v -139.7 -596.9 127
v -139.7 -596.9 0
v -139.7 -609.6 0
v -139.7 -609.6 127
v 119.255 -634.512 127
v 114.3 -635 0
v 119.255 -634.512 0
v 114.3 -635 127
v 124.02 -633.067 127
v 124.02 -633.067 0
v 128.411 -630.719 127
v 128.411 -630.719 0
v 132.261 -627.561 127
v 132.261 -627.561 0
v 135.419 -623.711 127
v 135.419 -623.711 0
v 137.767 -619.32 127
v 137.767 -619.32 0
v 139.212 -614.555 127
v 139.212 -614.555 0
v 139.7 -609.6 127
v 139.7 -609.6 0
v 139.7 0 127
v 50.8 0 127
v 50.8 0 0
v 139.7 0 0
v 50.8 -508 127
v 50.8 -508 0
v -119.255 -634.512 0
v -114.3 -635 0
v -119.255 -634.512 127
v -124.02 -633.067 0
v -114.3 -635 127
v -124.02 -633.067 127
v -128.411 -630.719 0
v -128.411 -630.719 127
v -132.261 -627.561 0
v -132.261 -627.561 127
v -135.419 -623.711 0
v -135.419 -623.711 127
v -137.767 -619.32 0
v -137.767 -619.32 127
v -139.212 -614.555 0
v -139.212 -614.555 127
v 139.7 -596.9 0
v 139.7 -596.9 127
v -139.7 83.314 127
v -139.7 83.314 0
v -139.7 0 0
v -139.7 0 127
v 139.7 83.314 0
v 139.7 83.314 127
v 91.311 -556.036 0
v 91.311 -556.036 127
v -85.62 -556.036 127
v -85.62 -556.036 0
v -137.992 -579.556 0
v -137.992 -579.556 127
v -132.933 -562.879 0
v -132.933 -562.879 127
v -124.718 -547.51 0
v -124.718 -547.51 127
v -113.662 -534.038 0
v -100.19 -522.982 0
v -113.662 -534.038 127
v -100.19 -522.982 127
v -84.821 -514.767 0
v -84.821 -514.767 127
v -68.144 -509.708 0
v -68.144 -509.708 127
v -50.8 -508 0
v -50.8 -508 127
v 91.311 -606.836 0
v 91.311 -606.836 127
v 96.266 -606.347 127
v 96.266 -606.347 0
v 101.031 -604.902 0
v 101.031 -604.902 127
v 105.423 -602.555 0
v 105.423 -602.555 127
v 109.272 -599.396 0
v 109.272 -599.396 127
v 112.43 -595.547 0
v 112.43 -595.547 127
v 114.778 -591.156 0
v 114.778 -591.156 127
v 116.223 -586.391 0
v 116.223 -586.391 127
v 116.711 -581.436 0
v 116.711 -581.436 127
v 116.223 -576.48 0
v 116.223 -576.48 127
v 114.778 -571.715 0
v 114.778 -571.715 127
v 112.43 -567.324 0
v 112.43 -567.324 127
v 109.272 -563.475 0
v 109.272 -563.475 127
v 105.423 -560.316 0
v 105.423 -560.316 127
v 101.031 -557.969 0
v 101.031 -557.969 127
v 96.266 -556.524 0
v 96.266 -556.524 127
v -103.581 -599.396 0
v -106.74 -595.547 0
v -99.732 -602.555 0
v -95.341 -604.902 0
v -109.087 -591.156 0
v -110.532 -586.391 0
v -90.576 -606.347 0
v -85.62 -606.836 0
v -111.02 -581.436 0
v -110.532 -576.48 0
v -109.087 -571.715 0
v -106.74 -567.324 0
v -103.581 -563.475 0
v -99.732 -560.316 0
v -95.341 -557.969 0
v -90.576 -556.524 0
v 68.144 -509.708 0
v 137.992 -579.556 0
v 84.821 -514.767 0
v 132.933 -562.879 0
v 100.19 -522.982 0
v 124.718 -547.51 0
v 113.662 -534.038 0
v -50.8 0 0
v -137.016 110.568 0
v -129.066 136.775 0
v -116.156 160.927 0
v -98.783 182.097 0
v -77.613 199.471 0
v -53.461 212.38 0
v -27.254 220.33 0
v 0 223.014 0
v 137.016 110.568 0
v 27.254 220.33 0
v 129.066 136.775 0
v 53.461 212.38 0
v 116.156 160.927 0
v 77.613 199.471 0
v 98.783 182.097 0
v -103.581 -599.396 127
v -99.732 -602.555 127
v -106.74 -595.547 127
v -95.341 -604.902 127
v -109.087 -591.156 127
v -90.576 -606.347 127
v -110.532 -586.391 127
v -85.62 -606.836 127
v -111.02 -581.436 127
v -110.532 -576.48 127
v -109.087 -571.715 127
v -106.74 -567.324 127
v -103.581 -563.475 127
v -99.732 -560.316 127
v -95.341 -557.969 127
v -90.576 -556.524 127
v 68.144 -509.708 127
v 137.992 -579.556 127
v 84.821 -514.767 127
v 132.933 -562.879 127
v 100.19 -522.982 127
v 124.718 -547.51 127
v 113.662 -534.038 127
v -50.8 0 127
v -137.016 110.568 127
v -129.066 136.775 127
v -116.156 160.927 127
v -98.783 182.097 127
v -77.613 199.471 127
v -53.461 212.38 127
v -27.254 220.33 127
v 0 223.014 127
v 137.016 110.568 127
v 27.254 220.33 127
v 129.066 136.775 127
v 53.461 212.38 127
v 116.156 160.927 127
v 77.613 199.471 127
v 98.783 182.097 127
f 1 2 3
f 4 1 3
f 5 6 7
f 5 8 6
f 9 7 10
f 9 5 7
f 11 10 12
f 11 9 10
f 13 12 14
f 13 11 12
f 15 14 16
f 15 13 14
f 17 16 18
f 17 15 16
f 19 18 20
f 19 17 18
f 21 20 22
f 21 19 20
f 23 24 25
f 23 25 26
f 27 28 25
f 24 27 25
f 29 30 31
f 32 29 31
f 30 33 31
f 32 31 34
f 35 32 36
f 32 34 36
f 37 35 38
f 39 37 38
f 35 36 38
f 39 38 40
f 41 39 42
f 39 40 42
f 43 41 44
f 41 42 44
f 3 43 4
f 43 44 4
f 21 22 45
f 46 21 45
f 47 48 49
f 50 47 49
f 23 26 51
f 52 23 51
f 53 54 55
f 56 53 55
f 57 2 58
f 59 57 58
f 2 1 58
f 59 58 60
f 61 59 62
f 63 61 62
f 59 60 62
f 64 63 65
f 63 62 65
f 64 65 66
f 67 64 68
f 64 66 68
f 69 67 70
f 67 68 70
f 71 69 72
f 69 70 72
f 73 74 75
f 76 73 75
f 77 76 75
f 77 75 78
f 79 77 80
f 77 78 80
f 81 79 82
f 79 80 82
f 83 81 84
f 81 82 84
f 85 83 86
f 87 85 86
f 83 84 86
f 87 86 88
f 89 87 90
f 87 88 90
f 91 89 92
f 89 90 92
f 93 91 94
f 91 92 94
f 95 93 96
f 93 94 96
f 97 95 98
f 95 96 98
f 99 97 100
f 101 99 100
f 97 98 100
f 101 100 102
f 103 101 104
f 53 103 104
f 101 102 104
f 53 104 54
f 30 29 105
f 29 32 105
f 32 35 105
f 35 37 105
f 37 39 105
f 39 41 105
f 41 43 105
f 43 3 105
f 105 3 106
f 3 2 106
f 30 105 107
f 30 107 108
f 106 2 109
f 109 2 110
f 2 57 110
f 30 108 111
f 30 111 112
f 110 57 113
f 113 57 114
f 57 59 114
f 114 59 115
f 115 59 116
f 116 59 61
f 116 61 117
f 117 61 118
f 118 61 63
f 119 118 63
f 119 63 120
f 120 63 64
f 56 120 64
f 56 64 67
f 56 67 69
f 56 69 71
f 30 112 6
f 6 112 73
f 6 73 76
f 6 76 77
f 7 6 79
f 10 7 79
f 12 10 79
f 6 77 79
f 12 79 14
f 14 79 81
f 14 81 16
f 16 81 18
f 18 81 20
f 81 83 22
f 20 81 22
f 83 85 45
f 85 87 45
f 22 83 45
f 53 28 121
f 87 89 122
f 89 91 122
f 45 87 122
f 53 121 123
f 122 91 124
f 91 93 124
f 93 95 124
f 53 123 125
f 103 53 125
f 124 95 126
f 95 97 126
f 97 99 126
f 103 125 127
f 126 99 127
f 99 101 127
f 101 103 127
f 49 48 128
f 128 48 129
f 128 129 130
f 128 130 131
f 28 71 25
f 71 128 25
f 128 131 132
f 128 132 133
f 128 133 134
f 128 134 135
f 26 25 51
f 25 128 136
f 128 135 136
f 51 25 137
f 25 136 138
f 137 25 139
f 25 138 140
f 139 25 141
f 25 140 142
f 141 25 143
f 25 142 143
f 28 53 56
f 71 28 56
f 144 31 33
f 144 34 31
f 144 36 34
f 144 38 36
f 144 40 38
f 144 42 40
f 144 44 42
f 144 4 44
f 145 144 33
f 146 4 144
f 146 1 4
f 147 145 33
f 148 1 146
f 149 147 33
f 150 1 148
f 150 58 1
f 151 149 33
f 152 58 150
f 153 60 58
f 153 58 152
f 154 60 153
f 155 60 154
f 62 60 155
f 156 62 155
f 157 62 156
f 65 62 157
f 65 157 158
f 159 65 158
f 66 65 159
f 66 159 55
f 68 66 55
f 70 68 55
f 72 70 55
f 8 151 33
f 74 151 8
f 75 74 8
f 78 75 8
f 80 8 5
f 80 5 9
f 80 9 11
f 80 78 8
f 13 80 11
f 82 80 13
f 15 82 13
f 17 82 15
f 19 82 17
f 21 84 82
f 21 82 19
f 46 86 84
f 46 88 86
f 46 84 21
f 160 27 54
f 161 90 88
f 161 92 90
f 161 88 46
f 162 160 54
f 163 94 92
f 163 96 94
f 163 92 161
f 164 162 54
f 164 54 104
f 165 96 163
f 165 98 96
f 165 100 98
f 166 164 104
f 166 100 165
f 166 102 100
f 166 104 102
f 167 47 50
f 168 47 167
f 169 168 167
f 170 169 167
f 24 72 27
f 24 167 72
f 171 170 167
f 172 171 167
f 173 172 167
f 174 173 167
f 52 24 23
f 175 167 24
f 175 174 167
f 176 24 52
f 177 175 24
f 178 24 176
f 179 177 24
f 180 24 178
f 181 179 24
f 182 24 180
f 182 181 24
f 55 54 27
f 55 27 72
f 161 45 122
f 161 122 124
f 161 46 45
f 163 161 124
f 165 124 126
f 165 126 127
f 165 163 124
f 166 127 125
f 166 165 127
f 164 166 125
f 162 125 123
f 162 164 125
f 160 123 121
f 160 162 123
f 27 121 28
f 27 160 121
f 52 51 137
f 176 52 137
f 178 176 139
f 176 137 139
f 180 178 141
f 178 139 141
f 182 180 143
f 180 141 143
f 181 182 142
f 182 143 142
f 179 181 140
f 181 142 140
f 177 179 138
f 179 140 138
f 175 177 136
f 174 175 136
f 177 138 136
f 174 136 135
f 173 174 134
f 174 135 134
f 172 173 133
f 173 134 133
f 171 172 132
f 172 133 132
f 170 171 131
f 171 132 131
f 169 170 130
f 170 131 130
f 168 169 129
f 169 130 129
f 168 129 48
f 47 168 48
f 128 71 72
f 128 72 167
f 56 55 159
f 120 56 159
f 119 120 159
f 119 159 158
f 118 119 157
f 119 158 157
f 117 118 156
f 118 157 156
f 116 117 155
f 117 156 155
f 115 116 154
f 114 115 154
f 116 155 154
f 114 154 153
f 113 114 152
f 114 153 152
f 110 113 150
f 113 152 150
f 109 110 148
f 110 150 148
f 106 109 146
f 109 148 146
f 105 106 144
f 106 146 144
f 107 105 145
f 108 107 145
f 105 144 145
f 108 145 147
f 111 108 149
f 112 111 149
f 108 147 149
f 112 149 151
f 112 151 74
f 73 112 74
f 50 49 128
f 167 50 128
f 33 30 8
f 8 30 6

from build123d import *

# Parameters (mm, degrees)
F0_W     = 101.6
F0_H     = 508
F1_DEPTH = 127
F2_R     = 88.89999
F3_R     = 88.89999
F5_DEPTH = 127.001
F6_R     = 25.4
F7_R     = 25.4


# Not quite as in the source:
# - a fillet or chamfer is up to 0.001 mm smaller than in the source, because OpenCascade refuses the exact size


with BuildPart() as f1:
    # F0 (on Top) → F1 (new body)
    with BuildSketch(Plane.XY):
        with BuildLine():
            ThreePointArc((139.7, 83.3142390684), (0, 223.0142390684), (-139.7, 83.3142390684))
            Line((-139.7, 83.3142390684), (-139.7, 0))
            Line((-139.7, 0), (-50.8, 0))
            Line((-50.8, 0), (50.8, 0))
            Line((50.8, 0), (139.7, 0))
            Line((139.7, 0), (139.7, 83.3142390684))
        make_face()
        with Locations((0, -254)):
            Rectangle(F0_W, F0_H)
        Polygon((50.8, -508), (-50.8, -508), (-139.7, -508), (-139.7, -635), (139.7, -635), (139.7, -508), align=None)
    extrude(amount=F1_DEPTH)

    # F2 (radius 88.9 in the source; OpenCascade refuses exactly that, so slightly less here)
    f2_edges = [f1.edges().sort_by_distance(p)[0] for p in [
        (139.7, -508, 63.5),
    ]]
    fillet(f2_edges, radius=F2_R)

    # F3 (radius 88.9 in the source; OpenCascade refuses exactly that, so slightly less here)
    f3_edges = [f1.edges().sort_by_distance(p)[0] for p in [
        (-139.7, -508, 63.5),
    ]]
    fillet(f3_edges, radius=F3_R)

    # F4 (on face) → F5 (cut, through all)
    with BuildSketch(Plane.XY.offset(127)):
        with BuildLine():
            Line((91.3110496293, -556.0355413279), (-85.6204037596, -556.0355413279))
            ThreePointArc((-85.6204037596, -556.0355413279), (-111.0204037596, -581.4355413279), (-85.6204037596, -606.8355413279))
            Line((-85.6204037596, -606.8355413279), (91.3110496293, -606.8355413279))
            ThreePointArc((91.3110496293, -606.8355413279), (116.7110496293, -581.4355413279), (91.3110496293, -556.0355413279))
        make_face()
    extrude(amount=-F5_DEPTH, mode=Mode.SUBTRACT)

    # F6
    f6_edges = [f1.edges().sort_by_distance(p)[0] for p in [
        (139.7, -635, 63.5),
    ]]
    fillet(f6_edges, radius=F6_R)

    # F7
    f7_edges = [f1.edges().sort_by_distance(p)[0] for p in [
        (-139.7, -635, 63.5),
    ]]
    fillet(f7_edges, radius=F7_R)


solid = f1.part
